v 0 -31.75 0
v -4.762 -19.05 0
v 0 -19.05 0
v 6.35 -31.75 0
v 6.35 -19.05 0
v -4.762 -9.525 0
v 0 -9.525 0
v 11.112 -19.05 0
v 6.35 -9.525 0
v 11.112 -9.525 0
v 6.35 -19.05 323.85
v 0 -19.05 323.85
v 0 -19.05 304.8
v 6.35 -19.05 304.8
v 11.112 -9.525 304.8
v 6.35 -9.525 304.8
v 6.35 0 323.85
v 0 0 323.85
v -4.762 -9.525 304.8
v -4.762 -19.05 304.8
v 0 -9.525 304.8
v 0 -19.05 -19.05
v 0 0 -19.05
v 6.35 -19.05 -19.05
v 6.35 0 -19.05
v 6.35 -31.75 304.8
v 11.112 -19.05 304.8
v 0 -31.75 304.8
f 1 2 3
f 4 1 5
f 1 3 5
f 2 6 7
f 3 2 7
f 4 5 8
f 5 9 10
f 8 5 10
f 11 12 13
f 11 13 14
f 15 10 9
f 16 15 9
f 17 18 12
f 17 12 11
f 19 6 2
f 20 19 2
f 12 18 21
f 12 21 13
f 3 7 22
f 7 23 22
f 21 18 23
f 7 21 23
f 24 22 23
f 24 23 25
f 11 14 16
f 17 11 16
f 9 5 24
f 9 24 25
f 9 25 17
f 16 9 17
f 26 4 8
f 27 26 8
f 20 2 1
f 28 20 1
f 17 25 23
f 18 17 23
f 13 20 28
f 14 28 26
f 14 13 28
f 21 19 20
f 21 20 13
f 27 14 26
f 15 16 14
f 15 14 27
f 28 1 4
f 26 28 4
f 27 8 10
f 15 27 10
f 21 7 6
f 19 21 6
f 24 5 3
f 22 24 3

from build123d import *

# Parameters (mm, degrees)
F1_DEPTH = 304.8
F3_DEPTH = 19.05
F5_DEPTH = 19.05


with BuildPart() as f1:
    # F0 (on Top) → F1 (new body)
    with BuildSketch(Plane.XY):
        Polygon((6.35, 0), (0, 0), (0, -9.525), (-4.7625, -9.525), (-4.7625, -19.05), (0, -31.75), (6.35, -31.75), (11.1125, -19.05), (11.1125, -9.525), (6.35, -9.525), align=None)
    extrude(amount=F1_DEPTH)

    # F2 (on face) → F3 (join)
    with BuildSketch(Plane(origin=(0, 0, 0), x_dir=(1, 0, 0), z_dir=(0, 0, -1))):
        Polygon((6.35, 9.525), (6.35, 19.05), (0, 19.05), (0, 9.525), (0, 0), (6.35, 0), align=None)
    extrude(amount=F3_DEPTH)

    # F4 (on face) → F5 (join)
    with BuildSketch(Plane.XY.offset(304.8)):
        Polygon((0, 0), (0, -9.525), (0, -19.05), (6.35, -19.05), (6.35, -9.525), (6.35, 0), align=None)
    extrude(amount=F5_DEPTH)


solid = f1.part
